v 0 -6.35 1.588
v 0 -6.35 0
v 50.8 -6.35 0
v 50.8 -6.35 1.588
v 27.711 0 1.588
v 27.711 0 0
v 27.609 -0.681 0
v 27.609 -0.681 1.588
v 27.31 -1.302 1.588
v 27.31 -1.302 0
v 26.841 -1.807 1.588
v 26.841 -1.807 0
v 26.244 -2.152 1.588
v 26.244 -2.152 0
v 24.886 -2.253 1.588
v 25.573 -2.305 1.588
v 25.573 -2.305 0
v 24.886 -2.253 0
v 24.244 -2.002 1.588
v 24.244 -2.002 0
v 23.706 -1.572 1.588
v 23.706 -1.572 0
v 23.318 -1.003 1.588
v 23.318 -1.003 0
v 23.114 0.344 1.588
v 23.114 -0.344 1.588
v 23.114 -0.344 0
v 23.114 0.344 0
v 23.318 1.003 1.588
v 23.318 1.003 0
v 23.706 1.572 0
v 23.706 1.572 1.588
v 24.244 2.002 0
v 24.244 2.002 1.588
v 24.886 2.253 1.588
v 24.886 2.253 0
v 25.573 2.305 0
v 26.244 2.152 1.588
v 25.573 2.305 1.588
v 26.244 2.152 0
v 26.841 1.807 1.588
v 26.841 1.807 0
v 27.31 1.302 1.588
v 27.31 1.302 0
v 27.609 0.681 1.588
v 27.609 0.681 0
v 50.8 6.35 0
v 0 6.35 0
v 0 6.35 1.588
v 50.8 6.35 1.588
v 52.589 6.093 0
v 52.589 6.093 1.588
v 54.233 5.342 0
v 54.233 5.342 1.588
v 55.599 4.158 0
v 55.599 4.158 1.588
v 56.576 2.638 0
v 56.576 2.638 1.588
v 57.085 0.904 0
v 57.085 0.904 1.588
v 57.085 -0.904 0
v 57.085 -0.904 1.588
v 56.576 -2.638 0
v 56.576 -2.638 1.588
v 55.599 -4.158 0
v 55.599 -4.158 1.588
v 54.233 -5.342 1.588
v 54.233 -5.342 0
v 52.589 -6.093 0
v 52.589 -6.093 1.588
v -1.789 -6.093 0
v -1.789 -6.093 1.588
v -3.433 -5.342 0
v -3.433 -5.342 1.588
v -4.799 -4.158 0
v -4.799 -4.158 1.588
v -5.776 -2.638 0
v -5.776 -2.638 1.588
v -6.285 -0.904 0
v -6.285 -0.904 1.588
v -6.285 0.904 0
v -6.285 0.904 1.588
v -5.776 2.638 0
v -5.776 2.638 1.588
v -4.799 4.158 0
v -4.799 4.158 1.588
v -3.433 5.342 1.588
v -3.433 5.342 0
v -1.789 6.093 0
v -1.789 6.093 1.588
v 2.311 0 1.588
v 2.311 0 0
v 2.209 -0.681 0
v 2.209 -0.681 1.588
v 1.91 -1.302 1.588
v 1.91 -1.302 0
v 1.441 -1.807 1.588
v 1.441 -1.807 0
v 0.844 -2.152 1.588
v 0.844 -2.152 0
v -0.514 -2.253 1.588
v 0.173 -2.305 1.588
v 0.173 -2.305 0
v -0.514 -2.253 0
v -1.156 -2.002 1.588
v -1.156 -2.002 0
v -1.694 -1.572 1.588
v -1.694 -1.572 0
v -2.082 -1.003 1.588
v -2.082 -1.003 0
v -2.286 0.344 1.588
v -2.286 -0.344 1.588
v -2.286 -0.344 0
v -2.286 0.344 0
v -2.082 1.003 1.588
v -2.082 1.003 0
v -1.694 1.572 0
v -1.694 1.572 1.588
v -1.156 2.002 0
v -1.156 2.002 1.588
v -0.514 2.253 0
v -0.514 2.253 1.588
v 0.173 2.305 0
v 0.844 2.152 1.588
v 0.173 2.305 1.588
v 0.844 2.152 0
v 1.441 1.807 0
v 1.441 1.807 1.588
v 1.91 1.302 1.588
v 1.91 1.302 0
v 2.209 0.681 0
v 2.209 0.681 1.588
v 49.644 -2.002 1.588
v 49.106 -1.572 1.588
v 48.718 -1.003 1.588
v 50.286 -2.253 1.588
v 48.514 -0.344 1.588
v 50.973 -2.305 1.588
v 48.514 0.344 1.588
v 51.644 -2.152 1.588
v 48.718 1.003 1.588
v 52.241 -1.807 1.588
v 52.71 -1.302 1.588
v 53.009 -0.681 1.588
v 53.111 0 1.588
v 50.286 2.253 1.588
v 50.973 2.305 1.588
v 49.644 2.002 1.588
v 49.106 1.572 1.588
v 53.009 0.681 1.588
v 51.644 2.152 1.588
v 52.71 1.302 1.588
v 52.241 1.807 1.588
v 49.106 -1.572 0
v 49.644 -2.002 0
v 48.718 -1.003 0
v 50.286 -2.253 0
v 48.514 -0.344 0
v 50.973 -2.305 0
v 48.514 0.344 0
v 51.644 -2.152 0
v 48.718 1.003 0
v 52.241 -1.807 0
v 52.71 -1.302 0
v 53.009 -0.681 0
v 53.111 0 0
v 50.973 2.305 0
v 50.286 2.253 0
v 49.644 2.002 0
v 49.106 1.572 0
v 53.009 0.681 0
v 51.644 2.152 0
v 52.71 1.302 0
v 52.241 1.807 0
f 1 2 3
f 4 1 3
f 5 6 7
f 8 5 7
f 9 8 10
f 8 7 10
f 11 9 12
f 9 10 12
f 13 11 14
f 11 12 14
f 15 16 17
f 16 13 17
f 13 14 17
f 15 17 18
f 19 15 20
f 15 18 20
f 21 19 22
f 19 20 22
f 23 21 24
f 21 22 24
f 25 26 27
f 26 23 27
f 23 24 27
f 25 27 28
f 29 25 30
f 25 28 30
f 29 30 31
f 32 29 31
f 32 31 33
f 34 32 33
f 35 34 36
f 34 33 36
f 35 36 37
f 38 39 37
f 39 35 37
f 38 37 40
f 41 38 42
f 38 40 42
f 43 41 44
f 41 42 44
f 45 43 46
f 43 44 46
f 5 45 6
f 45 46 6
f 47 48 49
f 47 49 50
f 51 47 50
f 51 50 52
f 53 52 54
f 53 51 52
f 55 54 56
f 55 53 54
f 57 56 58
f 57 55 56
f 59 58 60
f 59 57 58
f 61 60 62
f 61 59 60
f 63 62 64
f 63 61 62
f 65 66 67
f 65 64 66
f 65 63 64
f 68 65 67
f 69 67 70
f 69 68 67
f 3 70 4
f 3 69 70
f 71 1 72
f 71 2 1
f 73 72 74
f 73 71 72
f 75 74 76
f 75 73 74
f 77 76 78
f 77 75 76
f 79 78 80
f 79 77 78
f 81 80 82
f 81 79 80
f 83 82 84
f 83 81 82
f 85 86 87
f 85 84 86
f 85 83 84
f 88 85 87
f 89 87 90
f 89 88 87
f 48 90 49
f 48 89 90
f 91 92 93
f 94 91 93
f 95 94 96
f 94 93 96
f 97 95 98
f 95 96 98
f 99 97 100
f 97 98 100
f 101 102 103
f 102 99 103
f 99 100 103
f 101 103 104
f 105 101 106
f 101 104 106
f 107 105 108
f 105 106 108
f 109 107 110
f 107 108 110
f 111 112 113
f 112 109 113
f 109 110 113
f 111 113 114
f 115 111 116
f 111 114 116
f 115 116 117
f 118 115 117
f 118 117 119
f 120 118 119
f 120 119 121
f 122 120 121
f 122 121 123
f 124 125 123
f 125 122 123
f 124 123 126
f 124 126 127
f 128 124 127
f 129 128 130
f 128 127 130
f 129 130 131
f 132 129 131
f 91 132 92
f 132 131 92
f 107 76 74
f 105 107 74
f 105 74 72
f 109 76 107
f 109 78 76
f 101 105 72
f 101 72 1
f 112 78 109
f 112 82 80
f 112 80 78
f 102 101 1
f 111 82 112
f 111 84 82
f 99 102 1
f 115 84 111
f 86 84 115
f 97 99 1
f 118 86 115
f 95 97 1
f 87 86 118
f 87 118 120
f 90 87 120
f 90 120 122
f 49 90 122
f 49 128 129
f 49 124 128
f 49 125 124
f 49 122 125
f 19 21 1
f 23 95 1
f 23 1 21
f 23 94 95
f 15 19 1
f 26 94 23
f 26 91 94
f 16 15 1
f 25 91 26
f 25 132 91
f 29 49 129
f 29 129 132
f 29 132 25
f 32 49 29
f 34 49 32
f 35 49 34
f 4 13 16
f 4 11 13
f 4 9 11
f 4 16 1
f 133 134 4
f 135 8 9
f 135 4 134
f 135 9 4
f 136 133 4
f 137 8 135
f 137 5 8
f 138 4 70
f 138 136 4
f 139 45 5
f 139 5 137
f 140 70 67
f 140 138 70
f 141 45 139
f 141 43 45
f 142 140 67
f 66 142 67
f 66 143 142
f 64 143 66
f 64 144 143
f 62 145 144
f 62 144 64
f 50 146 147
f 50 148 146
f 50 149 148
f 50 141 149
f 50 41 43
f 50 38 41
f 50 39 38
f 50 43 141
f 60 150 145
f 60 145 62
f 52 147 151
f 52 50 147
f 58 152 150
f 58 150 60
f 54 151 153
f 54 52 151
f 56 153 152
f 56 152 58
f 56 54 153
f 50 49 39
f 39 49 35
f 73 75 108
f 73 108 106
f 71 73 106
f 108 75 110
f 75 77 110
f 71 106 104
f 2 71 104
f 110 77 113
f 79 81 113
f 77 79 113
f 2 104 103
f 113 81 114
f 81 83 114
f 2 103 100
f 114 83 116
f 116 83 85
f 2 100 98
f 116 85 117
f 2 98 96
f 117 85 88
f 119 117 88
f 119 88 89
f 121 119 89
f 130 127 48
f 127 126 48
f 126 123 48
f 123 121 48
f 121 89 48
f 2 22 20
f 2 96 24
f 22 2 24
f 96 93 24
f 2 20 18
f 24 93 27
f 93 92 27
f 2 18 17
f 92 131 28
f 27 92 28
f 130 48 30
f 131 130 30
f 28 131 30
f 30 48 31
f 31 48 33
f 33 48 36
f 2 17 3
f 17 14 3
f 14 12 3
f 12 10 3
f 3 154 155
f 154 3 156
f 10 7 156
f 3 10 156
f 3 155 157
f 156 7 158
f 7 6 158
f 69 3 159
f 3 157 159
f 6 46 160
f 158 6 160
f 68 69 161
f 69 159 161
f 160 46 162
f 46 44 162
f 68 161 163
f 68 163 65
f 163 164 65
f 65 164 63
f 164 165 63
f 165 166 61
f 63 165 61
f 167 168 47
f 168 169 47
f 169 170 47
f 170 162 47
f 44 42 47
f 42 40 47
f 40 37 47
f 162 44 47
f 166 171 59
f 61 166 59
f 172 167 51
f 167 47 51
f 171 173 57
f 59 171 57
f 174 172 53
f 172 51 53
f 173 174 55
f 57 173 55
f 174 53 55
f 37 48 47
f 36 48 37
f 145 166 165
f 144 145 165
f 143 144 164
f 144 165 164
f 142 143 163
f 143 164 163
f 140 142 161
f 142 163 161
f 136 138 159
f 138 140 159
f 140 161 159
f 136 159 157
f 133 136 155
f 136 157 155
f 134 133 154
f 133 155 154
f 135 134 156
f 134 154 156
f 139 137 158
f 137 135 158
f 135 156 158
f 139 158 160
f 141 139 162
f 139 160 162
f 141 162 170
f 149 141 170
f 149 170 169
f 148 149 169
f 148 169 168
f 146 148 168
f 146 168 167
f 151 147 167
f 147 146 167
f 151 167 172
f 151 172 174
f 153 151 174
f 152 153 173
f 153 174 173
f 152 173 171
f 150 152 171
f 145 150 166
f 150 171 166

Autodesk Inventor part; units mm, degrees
ref_plane "YZ Plane" through (0, 0, 0) normal (1, 0, 0) x (0, 1, 0)
ref_plane "XZ Plane" through (0, 0, 0) normal (0, 1, 0) x (-1, 0, 0)
ref_plane "XY Plane" through (0, 0, 0) normal (0, 0, 1) x (1, 0, 0)
sketch "Sketch1" plane through (0, 0, 0) normal (0, 0, 1) x (1, 0, 0)
  circle A0 centre (0, 0) radius 2.3114
  circle A1 centre (25.4, 0) radius 2.3114
  circle A2 centre (50.8, 0) radius 2.3114
  arc A3 (0, 6.35) -> (0, -6.35) centre (0, 0) ccw
  arc A4 (50.8, -6.35) -> (50.8, 6.35) centre (50.8, 0) ccw
  line L0 (0, 6.35) -> (50.8, 6.35)
  line L1 (0, -6.35) -> (50.8, -6.35)
  dimension "d0" = 4.6228
  dimension "d1" = 4.6228
  dimension "d2" = 4.6228
  dimension "d3" = 12.7
  dimension "d5" = 12.7
extrude "Extrusion1" add sketch "Sketch1" along normal blind 1.5875
properties part number "Joint Gusset" material "Acetal Resin, White"
